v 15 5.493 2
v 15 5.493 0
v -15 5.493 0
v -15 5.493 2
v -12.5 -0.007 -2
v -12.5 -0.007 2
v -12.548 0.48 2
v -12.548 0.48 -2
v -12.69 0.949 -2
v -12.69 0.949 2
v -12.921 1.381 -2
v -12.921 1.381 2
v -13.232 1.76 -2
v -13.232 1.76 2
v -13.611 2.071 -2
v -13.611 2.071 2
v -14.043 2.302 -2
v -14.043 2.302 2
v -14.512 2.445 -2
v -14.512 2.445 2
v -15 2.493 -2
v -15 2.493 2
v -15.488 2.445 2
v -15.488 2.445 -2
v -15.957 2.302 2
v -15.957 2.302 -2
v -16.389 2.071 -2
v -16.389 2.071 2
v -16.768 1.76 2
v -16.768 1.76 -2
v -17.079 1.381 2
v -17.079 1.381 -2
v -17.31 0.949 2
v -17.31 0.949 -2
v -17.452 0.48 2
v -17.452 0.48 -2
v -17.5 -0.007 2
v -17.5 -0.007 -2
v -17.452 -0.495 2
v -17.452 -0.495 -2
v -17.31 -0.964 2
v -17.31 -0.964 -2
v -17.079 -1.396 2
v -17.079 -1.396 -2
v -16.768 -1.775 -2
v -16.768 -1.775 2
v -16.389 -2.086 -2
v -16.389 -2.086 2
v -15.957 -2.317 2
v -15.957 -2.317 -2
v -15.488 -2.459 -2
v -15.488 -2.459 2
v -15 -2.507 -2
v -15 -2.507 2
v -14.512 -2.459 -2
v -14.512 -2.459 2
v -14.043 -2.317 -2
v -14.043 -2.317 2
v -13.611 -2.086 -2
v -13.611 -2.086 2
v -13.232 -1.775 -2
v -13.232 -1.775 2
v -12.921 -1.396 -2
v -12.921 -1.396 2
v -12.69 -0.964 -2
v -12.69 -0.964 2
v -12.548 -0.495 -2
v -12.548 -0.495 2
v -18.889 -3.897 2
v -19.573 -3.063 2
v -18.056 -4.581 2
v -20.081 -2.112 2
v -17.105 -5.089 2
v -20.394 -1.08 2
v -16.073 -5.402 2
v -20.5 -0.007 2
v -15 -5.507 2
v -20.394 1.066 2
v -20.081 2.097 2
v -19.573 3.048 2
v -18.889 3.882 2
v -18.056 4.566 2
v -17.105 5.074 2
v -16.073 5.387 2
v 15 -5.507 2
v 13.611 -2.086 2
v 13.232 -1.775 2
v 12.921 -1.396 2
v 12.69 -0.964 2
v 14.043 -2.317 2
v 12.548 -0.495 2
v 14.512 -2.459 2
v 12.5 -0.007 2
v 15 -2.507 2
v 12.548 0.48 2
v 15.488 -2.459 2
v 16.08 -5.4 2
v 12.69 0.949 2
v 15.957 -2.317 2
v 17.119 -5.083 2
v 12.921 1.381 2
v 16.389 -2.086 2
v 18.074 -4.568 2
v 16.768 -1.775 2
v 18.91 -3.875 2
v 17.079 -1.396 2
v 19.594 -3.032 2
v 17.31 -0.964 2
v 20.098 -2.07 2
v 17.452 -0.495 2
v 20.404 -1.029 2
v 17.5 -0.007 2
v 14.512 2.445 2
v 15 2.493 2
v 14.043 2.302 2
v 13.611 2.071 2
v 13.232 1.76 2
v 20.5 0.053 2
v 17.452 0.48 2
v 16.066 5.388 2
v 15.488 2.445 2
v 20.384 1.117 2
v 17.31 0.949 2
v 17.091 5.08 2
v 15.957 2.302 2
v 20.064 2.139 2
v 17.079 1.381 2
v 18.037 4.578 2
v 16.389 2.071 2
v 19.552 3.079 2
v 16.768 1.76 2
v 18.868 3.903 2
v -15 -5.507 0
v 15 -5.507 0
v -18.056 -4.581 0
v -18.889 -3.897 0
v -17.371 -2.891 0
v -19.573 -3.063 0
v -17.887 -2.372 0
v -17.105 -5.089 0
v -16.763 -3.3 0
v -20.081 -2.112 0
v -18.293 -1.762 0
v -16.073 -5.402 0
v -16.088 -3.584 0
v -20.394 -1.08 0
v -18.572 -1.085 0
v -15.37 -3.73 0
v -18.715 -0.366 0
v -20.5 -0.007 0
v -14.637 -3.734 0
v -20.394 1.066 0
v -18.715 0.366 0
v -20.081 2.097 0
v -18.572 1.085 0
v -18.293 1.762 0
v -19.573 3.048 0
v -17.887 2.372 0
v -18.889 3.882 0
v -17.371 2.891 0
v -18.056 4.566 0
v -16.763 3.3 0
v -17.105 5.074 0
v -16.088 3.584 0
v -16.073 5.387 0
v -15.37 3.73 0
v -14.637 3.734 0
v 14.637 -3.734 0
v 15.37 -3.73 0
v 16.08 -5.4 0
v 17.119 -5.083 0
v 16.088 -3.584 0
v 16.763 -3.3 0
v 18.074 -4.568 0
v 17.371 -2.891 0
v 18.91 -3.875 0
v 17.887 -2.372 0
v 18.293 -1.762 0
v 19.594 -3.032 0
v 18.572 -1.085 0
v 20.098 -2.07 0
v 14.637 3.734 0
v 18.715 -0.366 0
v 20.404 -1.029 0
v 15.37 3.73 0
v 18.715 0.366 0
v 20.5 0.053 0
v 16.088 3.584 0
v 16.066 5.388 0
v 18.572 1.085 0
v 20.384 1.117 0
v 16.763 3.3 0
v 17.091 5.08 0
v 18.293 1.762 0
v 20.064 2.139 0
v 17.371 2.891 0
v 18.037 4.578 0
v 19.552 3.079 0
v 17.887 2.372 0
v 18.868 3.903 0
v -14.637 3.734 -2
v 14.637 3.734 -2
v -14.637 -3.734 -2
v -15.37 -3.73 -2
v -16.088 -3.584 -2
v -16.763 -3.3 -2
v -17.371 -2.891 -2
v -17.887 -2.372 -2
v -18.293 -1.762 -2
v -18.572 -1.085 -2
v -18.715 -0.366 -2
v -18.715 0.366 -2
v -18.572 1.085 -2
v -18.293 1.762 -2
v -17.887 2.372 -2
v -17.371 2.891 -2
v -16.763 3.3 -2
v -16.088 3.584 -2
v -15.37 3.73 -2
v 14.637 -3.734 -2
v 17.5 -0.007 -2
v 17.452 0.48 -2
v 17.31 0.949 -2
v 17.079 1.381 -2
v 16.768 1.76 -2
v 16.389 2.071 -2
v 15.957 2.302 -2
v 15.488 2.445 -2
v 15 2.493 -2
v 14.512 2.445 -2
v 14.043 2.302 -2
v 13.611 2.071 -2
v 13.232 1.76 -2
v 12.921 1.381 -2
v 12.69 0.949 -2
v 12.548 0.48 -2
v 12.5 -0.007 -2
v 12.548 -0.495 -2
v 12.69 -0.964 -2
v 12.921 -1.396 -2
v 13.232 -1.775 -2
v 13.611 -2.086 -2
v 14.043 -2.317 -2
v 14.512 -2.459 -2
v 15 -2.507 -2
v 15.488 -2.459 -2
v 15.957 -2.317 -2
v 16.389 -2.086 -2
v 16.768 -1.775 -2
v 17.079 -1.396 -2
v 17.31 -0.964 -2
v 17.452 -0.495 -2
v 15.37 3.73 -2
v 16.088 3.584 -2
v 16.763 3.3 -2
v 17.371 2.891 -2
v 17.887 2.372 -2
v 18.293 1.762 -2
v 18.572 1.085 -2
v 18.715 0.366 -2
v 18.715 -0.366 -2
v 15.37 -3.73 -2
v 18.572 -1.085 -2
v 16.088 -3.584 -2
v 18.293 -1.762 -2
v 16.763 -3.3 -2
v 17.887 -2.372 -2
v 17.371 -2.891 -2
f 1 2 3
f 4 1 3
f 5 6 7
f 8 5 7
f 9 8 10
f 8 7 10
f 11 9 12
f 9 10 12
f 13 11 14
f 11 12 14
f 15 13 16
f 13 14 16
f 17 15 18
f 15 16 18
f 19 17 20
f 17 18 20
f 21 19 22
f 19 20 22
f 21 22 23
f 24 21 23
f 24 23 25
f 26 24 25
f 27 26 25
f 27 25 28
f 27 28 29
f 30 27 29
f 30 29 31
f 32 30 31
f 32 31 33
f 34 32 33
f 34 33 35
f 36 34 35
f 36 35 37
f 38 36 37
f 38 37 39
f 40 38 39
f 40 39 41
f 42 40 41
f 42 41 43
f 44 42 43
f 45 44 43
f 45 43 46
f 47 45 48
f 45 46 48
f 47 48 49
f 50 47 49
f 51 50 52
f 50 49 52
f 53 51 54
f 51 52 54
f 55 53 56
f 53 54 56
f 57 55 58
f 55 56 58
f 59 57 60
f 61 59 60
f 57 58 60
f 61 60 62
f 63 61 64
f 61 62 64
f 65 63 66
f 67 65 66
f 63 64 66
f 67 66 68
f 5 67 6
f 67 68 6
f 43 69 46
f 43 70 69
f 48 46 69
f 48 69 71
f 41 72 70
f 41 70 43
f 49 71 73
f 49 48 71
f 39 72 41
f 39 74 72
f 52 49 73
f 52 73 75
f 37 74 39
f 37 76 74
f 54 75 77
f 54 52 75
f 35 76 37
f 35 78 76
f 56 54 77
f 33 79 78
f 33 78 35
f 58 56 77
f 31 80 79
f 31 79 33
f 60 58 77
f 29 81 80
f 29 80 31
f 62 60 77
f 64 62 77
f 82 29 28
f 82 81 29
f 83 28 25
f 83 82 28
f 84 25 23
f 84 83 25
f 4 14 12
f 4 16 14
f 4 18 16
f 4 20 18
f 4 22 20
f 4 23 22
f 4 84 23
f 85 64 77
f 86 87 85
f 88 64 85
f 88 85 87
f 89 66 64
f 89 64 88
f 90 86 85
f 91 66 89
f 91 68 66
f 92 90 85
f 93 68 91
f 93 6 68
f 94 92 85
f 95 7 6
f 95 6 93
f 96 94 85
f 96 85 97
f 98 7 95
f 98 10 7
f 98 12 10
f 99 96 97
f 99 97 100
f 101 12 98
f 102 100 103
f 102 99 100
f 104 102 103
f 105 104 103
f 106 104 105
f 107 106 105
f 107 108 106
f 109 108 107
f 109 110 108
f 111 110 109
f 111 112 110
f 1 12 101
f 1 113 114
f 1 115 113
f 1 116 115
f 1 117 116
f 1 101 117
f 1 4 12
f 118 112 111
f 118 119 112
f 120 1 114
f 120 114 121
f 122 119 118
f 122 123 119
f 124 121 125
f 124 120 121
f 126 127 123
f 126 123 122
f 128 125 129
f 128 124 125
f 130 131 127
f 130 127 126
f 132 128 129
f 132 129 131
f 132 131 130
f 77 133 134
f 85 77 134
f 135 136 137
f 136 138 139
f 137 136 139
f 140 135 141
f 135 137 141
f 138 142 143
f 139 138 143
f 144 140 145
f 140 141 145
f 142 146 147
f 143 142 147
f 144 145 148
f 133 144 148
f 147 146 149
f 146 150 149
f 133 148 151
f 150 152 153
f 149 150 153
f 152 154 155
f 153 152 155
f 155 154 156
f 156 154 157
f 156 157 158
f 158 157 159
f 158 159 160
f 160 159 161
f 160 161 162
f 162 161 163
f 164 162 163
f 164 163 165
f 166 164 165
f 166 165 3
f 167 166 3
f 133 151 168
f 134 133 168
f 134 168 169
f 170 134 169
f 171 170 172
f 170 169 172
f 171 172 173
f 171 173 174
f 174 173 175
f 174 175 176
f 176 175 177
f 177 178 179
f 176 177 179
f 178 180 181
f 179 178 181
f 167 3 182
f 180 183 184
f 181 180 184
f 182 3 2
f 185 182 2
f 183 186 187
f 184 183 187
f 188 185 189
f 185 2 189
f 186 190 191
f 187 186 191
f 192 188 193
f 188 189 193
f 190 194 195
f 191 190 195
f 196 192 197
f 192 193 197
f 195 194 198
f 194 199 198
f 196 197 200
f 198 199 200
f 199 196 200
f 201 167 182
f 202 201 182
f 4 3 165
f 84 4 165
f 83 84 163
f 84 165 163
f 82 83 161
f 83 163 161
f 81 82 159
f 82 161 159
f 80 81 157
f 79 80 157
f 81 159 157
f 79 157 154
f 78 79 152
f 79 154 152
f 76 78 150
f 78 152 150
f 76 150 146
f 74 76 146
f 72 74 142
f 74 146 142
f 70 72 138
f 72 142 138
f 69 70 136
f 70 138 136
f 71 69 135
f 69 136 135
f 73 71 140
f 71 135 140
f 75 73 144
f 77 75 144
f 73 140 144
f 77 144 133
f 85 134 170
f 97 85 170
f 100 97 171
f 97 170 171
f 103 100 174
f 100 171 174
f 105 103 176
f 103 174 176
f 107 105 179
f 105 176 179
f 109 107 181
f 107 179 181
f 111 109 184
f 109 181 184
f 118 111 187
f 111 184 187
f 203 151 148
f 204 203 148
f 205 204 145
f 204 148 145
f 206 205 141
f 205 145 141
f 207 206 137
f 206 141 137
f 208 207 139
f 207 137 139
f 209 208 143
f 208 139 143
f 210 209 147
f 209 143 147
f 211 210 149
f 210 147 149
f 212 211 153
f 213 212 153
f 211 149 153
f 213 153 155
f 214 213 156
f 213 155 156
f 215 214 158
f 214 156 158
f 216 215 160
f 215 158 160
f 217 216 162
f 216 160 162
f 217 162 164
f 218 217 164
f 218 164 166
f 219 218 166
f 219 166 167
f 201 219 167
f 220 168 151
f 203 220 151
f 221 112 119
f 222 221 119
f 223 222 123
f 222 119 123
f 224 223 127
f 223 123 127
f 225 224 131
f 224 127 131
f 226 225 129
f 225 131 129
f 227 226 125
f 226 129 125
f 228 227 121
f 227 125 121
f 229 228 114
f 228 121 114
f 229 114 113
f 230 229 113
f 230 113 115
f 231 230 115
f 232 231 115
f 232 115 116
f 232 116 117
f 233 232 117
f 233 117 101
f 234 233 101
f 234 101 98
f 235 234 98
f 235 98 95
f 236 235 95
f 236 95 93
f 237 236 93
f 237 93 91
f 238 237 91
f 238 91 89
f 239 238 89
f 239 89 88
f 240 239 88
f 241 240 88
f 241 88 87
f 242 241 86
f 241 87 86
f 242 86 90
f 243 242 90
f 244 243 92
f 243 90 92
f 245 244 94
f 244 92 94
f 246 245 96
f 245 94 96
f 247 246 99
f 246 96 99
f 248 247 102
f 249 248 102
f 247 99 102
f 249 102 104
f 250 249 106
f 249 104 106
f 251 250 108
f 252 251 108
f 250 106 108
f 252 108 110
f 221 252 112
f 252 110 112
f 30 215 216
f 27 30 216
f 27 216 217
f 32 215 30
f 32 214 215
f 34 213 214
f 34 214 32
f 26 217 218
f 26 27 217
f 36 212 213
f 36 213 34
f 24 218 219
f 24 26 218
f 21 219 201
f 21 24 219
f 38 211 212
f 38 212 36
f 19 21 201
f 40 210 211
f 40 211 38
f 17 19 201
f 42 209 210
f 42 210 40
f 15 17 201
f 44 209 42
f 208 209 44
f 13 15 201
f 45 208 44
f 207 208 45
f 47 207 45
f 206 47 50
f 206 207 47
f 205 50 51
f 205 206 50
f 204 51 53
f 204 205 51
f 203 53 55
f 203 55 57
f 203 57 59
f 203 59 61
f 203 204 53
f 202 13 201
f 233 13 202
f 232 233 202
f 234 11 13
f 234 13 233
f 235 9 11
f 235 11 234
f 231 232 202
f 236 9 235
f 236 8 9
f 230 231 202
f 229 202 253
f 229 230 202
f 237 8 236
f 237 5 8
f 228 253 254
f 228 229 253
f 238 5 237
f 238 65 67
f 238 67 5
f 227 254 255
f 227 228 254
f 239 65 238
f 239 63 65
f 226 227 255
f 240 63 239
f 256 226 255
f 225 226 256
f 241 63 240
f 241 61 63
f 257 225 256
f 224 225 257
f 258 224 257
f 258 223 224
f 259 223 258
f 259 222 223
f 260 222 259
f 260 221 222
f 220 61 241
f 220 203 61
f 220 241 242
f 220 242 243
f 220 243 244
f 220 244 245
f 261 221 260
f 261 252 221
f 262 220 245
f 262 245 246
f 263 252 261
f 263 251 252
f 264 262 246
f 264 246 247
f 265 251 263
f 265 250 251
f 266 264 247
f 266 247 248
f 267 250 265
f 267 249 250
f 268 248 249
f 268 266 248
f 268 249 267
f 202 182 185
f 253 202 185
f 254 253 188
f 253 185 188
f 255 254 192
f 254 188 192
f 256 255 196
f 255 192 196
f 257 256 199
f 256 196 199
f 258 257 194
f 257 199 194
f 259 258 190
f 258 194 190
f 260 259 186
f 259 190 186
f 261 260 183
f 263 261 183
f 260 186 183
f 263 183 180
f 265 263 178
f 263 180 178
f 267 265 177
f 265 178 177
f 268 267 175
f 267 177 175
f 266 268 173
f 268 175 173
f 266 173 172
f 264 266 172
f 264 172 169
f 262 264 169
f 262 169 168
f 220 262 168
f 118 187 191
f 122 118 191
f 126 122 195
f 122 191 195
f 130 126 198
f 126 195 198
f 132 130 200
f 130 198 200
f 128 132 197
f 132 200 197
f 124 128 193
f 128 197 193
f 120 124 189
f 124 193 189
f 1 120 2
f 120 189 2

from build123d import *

# Parameters (mm, degrees)
F1_DEPTH = 2
F3_DEPTH = 2
F4_R     = 2.5
F5_DEPTH = 4.001


with BuildPart() as f1:
    # F0 (on Top) → F1 (new body)
    with BuildSketch(Plane.XY):
        with BuildLine():
            ThreePointArc((20.499703, 0.052712), (18.867793, 3.902856), (15.000031, 5.492559))
            Line((15.000031, 5.492559), (-14.999969, 5.492559))
            ThreePointArc((-14.999969, 5.492559), (-18.889056, 3.881647), (-20.499969, -0.007441))
            ThreePointArc((-20.499969, -0.007441), (-18.889056, -3.896528), (-14.999969, -5.507441))
            Line((-14.999969, -5.507441), (15.000031, -5.507441))
            ThreePointArc((15.000031, -5.507441), (18.910328, -3.875202), (20.499703, 0.052712))
        make_face()
    extrude(amount=F1_DEPTH)

    # F2 (on face) → F3 (join)
    with BuildSketch(Plane(origin=(0, 0, 0), x_dir=(1, 0, 0), z_dir=(0, 0, -1))):
        with BuildLine():
            Line((14.637494, 3.734077), (-14.637494, 3.734077))
            ThreePointArc((-14.637494, 3.734077), (-18.732699, 0), (-14.637494, -3.734077))
            Line((-14.637494, -3.734077), (14.637494, -3.734077))
            ThreePointArc((14.637494, -3.734077), (18.732699, 0), (14.637494, 3.734077))
        make_face()
    extrude(amount=F3_DEPTH)

    # F4 (on face) → F5 (cut, through all)
    with BuildSketch(Plane.XY.offset(2)):
        with Locations((-14.999969, -0.007441)):
            Circle(F4_R)
        with Locations((15.000031, -0.007441)):
            Circle(F4_R)
    extrude(amount=-F5_DEPTH, mode=Mode.SUBTRACT)


solid = f1.part
